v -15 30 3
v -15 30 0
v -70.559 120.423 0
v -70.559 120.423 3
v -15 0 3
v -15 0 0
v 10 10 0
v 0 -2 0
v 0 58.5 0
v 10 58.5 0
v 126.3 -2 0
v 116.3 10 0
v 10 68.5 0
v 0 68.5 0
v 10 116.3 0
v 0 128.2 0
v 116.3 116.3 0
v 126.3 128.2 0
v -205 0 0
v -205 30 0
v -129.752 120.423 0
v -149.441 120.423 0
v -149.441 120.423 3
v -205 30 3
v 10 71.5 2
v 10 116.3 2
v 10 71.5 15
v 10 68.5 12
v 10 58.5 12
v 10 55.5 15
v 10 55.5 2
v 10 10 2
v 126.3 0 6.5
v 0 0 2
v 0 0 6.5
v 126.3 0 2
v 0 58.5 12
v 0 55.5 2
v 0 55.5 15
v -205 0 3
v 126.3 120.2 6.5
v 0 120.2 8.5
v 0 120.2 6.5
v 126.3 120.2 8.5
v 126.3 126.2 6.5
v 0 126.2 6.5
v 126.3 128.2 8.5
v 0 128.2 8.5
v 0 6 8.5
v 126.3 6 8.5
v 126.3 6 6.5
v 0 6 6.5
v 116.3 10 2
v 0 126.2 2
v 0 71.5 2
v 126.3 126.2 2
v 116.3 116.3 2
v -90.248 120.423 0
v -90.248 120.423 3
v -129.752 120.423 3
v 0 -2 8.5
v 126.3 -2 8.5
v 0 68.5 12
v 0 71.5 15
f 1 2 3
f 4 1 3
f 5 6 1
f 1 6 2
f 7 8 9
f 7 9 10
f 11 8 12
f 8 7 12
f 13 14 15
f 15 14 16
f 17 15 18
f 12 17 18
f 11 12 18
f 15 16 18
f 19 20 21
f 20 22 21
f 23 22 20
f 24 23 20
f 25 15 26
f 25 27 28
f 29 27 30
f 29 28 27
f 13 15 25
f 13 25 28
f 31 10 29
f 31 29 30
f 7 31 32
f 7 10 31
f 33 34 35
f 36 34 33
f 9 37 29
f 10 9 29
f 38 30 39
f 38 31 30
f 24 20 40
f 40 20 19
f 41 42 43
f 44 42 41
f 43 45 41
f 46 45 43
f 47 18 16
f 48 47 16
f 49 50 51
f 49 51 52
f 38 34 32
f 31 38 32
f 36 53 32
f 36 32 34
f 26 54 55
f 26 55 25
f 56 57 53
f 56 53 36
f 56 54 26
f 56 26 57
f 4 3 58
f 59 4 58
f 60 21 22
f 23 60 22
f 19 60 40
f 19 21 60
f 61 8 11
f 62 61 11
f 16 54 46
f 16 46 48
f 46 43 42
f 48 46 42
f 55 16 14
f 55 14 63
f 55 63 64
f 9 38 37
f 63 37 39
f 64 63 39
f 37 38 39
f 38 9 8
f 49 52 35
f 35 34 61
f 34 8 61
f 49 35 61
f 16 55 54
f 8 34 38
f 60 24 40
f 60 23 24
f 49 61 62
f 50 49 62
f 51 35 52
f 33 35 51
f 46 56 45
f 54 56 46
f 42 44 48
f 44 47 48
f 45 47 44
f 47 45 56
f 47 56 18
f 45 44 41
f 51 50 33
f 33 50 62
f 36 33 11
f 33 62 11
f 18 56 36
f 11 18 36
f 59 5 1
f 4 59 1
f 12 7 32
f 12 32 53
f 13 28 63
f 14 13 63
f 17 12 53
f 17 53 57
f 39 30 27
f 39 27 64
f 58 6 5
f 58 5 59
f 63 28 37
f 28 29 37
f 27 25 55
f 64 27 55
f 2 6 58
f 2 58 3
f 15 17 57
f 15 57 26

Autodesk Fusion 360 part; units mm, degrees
sketch "Sketch1" plane through (0, 0, 0) normal (0, 0, 1) x (1, 0, 0)
  line L0 (0, 0) -> (126.3, 0)
  line L1 (126.3, 0) -> (126.3, 126.2)
  line L2 (126.3, 126.2) -> (0, 126.2)
  line L3 (0, 126.2) -> (0, 0)
  line L4 (0, 0) -> (126.3, 0)
  line L5 (126.3, 0) -> (126.3, 126.2)
  line L6 (126.3, 126.2) -> (0, 126.2)
  line L7 (0, 126.2) -> (0, 0)
  line L8 (126.3, 128.2) -> (0, 128.2)
  line L9 (0, -2) -> (126.3, -2)
  line L10 (0, 126.2) -> (0, 128.2)
  line L11 (126.3, 126.2) -> (126.3, 128.2)
  line L12 (126.3, -2) -> (126.3, 0)
  line L13 (0, 0) -> (0, -2)
  dimension "d1" = 126.3
  dimension "d2" = 126.2
sketch "Sketch2" plane through (0, 0, 0) normal (0, 0, 1) x (1, 0, 0)
  line L0 (10, 10) -> (116.3, 10)
  line L1 (116.3, 10) -> (116.3, 116.3)
  line L2 (116.3, 116.3) -> (10, 116.3)
  line L3 (10, 116.3) -> (10, 10)
  dimension "d4" = 106.3
  dimension "d5" = 106.3
extrude "Extrude1" add sketch "Sketch1" along normal blind 2 makes body 1
extrude "Extrude2" cut sketch "Sketch2" along normal blind 2 bodies 1
sketch "Sketch3" plane through (0, 0, 2) normal (0, 0, 1) x (-1, 0, 0)
  line L0 (-10, -116.3) -> (-116.3, -116.3)
  line L1 (-116.3, -116.3) -> (-116.3, -10)
  line L2 (-116.3, -10) -> (-10, -10)
  line L3 (-10, -10) -> (-10, -116.3)
  line L4 (0, -128.2) -> (0, 2)
  line L5 (0, 2) -> (-126.3, 2)
  line L6 (-126.3, 2) -> (-126.3, -128.2)
  line L7 (-126.3, -128.2) -> (0, -128.2)
  line L8 (0, 0) -> (-126.3, 0)
  line L9 (-126.3, 2) -> (0, 2)
  line L10 (0, -128.2) -> (-126.3, -128.2)
  line L11 (-126.3, -128.2) -> (-126.3, -126.2)
  line L12 (-126.3, -126.2) -> (0, -126.2)
  line L13 (0, -126.2) -> (0, -128.2)
  dimension "d10" = 2
extrude "Extrude3" add sketch "Sketch3" along normal blind 6.5 contours L4 L6 L7 L10 L11 L12 L13 | L4 L5 L6 L8 L9 bodies 1
sketch "Sketch4" plane through (0, 126.2, 0) normal (0, -1, 0) x (1, 0, 0)
  line L0 (0, 2) -> (126.3, 2)
  line L1 (126.3, 2) -> (126.3, 8.5)
  line L2 (126.3, 8.5) -> (0, 8.5)
  line L3 (0, 8.5) -> (0, 2)
  line L4 (0, 8.5) -> (126.3, 8.5)
  line L5 (126.3, 8.5) -> (126.3, 6.5)
  line L6 (126.3, 6.5) -> (0, 6.5)
  line L7 (0, 6.5) -> (0, 8.5)
  dimension "d13" = 2
sketch "Sketch5" plane through (0, 0, 0) normal (0, 1, 0) x (-1, 0, 0)
  line L0 (-126.3, 2) -> (0, 2)
  line L1 (0, 2) -> (0, 8.5)
  line L2 (0, 8.5) -> (-126.3, 8.5)
  line L3 (-126.3, 8.5) -> (-126.3, 2)
  line L4 (-126.3, 8.5) -> (0, 8.5)
  line L5 (0, 8.5) -> (0, 6.5)
  line L6 (0, 6.5) -> (-126.3, 6.5)
  line L7 (-126.3, 6.5) -> (-126.3, 8.5)
  dimension "d14" = 2
extrude "Extrude4" add sketch "Sketch4" along normal blind 6 contours L1 L2 L3 L4 L5 L6 L7 bodies 1
extrude "Extrude5" add sketch "Sketch5" along normal blind 6 contours L1 L2 L3 L4 L5 L6 L7 bodies 1
sketch "Sketch7" plane through (0, 0, 0) normal (0, 0, 1) x (1, 0, 0)
  line L0 (-15, 0) -> (-15, 30)
  line L1 (-15, 30) -> (-15, 0)
  line L2 (-15, 0) -> (-90.2485, 120.4228)
  line L3 (-15, 30) -> (-70.5593, 120.4228)
  line L4 (-70.5593, 120.4228) -> (-90.2485, 120.4228)
  dimension "d26" = 32
  dimension "d27" = 142
ref_plane "WorkPlane2" through (-110, 0, 0) normal (1, 0, 0) x (0, 1, 0)
extrude "Extrude7" add sketch "Sketch7" along normal blind 3 separate body makes body 2
mirror "Mirror2" about plane through (-110, 0, 0) normal (1, 0, 0) of "Extrude7" makes body 3
sketch "Sketch8" plane through (0, 0, 2) normal (0, 0, 1) x (-1, 0, 0)
  line L0 (0, 0) -> (-126.3, 0)
  line L1 (-126.3, 0) -> (-126.3, -126.2)
  line L2 (-126.3, -126.2) -> (0, -126.2)
  line L3 (0, -126.2) -> (0, 0)
  line L4 (-10, -116.3) -> (-116.3, -116.3)
  line L5 (-116.3, -116.3) -> (-116.3, -10)
  line L6 (-116.3, -10) -> (-10, -10)
  line L7 (-10, -10) -> (-10, -116.3)
  line L8 (0, -121) -> (0, -6)
  line L9 (0, -6) -> (0, -58.5)
  line L10 (0, -58.5) -> (-10, -58.5)
  line L11 (-10, -58.5) -> (-10, -68.5)
  line L12 (-10, -68.5) -> (0, -68.5)
  line L13 (0, -68.5) -> (0, -58.5)
  line L14 (0, -68.5) -> (-10, -68.5)
  line L15 (-10, -68.5) -> (-10, -71.5)
  line L16 (-10, -71.5) -> (0, -71.5)
  line L17 (0, -71.5) -> (0, -68.5)
  line L18 (0, -58.5) -> (-10, -58.5)
  line L19 (-10, -58.5) -> (-10, -55.5)
  line L20 (-10, -55.5) -> (0, -55.5)
  line L21 (0, -55.5) -> (0, -58.5)
  dimension "d33" = 52.5
  dimension "d34" = 10
  dimension "d35" = 3
  dimension "d36" = 3
sketch "Sketch9" plane through (0, 0, 2) normal (0, 0, 1) x (-1, 0, 0)
extrude "Extrude8" add sketch "Sketch8" along normal blind 10 contours L3 L7 L8 L9 L10 L18 L19 L20 L21 | L3 L7 L8 L12 L14 L15 L16 L17 bodies 1
sketch "Sketch10" plane through (0, 0, 12) normal (0, 0, 1) x (-1, 0, 0)
  line L0 (0, -71.5) -> (0, -68.5)
  line L1 (0, -68.5) -> (-10, -68.5)
  line L2 (-10, -68.5) -> (-10, -71.5)
  line L3 (-10, -71.5) -> (0, -71.5)
  line L4 (0, -71.5) -> (-10, -71.5)
  line L5 (-10, -71.5) -> (-10, -55.5)
  line L6 (-10, -55.5) -> (0, -55.5)
  line L7 (0, -55.5) -> (0, -71.5)
extrude "Extrude9" add sketch "Sketch10" along normal blind 3 bodies 1
extrude "Extrude10" cut 1 faces at (3.3333, 65.1667, 2) along direction (0, 0, -1) blind 3 on bodies 1 bodies 1
